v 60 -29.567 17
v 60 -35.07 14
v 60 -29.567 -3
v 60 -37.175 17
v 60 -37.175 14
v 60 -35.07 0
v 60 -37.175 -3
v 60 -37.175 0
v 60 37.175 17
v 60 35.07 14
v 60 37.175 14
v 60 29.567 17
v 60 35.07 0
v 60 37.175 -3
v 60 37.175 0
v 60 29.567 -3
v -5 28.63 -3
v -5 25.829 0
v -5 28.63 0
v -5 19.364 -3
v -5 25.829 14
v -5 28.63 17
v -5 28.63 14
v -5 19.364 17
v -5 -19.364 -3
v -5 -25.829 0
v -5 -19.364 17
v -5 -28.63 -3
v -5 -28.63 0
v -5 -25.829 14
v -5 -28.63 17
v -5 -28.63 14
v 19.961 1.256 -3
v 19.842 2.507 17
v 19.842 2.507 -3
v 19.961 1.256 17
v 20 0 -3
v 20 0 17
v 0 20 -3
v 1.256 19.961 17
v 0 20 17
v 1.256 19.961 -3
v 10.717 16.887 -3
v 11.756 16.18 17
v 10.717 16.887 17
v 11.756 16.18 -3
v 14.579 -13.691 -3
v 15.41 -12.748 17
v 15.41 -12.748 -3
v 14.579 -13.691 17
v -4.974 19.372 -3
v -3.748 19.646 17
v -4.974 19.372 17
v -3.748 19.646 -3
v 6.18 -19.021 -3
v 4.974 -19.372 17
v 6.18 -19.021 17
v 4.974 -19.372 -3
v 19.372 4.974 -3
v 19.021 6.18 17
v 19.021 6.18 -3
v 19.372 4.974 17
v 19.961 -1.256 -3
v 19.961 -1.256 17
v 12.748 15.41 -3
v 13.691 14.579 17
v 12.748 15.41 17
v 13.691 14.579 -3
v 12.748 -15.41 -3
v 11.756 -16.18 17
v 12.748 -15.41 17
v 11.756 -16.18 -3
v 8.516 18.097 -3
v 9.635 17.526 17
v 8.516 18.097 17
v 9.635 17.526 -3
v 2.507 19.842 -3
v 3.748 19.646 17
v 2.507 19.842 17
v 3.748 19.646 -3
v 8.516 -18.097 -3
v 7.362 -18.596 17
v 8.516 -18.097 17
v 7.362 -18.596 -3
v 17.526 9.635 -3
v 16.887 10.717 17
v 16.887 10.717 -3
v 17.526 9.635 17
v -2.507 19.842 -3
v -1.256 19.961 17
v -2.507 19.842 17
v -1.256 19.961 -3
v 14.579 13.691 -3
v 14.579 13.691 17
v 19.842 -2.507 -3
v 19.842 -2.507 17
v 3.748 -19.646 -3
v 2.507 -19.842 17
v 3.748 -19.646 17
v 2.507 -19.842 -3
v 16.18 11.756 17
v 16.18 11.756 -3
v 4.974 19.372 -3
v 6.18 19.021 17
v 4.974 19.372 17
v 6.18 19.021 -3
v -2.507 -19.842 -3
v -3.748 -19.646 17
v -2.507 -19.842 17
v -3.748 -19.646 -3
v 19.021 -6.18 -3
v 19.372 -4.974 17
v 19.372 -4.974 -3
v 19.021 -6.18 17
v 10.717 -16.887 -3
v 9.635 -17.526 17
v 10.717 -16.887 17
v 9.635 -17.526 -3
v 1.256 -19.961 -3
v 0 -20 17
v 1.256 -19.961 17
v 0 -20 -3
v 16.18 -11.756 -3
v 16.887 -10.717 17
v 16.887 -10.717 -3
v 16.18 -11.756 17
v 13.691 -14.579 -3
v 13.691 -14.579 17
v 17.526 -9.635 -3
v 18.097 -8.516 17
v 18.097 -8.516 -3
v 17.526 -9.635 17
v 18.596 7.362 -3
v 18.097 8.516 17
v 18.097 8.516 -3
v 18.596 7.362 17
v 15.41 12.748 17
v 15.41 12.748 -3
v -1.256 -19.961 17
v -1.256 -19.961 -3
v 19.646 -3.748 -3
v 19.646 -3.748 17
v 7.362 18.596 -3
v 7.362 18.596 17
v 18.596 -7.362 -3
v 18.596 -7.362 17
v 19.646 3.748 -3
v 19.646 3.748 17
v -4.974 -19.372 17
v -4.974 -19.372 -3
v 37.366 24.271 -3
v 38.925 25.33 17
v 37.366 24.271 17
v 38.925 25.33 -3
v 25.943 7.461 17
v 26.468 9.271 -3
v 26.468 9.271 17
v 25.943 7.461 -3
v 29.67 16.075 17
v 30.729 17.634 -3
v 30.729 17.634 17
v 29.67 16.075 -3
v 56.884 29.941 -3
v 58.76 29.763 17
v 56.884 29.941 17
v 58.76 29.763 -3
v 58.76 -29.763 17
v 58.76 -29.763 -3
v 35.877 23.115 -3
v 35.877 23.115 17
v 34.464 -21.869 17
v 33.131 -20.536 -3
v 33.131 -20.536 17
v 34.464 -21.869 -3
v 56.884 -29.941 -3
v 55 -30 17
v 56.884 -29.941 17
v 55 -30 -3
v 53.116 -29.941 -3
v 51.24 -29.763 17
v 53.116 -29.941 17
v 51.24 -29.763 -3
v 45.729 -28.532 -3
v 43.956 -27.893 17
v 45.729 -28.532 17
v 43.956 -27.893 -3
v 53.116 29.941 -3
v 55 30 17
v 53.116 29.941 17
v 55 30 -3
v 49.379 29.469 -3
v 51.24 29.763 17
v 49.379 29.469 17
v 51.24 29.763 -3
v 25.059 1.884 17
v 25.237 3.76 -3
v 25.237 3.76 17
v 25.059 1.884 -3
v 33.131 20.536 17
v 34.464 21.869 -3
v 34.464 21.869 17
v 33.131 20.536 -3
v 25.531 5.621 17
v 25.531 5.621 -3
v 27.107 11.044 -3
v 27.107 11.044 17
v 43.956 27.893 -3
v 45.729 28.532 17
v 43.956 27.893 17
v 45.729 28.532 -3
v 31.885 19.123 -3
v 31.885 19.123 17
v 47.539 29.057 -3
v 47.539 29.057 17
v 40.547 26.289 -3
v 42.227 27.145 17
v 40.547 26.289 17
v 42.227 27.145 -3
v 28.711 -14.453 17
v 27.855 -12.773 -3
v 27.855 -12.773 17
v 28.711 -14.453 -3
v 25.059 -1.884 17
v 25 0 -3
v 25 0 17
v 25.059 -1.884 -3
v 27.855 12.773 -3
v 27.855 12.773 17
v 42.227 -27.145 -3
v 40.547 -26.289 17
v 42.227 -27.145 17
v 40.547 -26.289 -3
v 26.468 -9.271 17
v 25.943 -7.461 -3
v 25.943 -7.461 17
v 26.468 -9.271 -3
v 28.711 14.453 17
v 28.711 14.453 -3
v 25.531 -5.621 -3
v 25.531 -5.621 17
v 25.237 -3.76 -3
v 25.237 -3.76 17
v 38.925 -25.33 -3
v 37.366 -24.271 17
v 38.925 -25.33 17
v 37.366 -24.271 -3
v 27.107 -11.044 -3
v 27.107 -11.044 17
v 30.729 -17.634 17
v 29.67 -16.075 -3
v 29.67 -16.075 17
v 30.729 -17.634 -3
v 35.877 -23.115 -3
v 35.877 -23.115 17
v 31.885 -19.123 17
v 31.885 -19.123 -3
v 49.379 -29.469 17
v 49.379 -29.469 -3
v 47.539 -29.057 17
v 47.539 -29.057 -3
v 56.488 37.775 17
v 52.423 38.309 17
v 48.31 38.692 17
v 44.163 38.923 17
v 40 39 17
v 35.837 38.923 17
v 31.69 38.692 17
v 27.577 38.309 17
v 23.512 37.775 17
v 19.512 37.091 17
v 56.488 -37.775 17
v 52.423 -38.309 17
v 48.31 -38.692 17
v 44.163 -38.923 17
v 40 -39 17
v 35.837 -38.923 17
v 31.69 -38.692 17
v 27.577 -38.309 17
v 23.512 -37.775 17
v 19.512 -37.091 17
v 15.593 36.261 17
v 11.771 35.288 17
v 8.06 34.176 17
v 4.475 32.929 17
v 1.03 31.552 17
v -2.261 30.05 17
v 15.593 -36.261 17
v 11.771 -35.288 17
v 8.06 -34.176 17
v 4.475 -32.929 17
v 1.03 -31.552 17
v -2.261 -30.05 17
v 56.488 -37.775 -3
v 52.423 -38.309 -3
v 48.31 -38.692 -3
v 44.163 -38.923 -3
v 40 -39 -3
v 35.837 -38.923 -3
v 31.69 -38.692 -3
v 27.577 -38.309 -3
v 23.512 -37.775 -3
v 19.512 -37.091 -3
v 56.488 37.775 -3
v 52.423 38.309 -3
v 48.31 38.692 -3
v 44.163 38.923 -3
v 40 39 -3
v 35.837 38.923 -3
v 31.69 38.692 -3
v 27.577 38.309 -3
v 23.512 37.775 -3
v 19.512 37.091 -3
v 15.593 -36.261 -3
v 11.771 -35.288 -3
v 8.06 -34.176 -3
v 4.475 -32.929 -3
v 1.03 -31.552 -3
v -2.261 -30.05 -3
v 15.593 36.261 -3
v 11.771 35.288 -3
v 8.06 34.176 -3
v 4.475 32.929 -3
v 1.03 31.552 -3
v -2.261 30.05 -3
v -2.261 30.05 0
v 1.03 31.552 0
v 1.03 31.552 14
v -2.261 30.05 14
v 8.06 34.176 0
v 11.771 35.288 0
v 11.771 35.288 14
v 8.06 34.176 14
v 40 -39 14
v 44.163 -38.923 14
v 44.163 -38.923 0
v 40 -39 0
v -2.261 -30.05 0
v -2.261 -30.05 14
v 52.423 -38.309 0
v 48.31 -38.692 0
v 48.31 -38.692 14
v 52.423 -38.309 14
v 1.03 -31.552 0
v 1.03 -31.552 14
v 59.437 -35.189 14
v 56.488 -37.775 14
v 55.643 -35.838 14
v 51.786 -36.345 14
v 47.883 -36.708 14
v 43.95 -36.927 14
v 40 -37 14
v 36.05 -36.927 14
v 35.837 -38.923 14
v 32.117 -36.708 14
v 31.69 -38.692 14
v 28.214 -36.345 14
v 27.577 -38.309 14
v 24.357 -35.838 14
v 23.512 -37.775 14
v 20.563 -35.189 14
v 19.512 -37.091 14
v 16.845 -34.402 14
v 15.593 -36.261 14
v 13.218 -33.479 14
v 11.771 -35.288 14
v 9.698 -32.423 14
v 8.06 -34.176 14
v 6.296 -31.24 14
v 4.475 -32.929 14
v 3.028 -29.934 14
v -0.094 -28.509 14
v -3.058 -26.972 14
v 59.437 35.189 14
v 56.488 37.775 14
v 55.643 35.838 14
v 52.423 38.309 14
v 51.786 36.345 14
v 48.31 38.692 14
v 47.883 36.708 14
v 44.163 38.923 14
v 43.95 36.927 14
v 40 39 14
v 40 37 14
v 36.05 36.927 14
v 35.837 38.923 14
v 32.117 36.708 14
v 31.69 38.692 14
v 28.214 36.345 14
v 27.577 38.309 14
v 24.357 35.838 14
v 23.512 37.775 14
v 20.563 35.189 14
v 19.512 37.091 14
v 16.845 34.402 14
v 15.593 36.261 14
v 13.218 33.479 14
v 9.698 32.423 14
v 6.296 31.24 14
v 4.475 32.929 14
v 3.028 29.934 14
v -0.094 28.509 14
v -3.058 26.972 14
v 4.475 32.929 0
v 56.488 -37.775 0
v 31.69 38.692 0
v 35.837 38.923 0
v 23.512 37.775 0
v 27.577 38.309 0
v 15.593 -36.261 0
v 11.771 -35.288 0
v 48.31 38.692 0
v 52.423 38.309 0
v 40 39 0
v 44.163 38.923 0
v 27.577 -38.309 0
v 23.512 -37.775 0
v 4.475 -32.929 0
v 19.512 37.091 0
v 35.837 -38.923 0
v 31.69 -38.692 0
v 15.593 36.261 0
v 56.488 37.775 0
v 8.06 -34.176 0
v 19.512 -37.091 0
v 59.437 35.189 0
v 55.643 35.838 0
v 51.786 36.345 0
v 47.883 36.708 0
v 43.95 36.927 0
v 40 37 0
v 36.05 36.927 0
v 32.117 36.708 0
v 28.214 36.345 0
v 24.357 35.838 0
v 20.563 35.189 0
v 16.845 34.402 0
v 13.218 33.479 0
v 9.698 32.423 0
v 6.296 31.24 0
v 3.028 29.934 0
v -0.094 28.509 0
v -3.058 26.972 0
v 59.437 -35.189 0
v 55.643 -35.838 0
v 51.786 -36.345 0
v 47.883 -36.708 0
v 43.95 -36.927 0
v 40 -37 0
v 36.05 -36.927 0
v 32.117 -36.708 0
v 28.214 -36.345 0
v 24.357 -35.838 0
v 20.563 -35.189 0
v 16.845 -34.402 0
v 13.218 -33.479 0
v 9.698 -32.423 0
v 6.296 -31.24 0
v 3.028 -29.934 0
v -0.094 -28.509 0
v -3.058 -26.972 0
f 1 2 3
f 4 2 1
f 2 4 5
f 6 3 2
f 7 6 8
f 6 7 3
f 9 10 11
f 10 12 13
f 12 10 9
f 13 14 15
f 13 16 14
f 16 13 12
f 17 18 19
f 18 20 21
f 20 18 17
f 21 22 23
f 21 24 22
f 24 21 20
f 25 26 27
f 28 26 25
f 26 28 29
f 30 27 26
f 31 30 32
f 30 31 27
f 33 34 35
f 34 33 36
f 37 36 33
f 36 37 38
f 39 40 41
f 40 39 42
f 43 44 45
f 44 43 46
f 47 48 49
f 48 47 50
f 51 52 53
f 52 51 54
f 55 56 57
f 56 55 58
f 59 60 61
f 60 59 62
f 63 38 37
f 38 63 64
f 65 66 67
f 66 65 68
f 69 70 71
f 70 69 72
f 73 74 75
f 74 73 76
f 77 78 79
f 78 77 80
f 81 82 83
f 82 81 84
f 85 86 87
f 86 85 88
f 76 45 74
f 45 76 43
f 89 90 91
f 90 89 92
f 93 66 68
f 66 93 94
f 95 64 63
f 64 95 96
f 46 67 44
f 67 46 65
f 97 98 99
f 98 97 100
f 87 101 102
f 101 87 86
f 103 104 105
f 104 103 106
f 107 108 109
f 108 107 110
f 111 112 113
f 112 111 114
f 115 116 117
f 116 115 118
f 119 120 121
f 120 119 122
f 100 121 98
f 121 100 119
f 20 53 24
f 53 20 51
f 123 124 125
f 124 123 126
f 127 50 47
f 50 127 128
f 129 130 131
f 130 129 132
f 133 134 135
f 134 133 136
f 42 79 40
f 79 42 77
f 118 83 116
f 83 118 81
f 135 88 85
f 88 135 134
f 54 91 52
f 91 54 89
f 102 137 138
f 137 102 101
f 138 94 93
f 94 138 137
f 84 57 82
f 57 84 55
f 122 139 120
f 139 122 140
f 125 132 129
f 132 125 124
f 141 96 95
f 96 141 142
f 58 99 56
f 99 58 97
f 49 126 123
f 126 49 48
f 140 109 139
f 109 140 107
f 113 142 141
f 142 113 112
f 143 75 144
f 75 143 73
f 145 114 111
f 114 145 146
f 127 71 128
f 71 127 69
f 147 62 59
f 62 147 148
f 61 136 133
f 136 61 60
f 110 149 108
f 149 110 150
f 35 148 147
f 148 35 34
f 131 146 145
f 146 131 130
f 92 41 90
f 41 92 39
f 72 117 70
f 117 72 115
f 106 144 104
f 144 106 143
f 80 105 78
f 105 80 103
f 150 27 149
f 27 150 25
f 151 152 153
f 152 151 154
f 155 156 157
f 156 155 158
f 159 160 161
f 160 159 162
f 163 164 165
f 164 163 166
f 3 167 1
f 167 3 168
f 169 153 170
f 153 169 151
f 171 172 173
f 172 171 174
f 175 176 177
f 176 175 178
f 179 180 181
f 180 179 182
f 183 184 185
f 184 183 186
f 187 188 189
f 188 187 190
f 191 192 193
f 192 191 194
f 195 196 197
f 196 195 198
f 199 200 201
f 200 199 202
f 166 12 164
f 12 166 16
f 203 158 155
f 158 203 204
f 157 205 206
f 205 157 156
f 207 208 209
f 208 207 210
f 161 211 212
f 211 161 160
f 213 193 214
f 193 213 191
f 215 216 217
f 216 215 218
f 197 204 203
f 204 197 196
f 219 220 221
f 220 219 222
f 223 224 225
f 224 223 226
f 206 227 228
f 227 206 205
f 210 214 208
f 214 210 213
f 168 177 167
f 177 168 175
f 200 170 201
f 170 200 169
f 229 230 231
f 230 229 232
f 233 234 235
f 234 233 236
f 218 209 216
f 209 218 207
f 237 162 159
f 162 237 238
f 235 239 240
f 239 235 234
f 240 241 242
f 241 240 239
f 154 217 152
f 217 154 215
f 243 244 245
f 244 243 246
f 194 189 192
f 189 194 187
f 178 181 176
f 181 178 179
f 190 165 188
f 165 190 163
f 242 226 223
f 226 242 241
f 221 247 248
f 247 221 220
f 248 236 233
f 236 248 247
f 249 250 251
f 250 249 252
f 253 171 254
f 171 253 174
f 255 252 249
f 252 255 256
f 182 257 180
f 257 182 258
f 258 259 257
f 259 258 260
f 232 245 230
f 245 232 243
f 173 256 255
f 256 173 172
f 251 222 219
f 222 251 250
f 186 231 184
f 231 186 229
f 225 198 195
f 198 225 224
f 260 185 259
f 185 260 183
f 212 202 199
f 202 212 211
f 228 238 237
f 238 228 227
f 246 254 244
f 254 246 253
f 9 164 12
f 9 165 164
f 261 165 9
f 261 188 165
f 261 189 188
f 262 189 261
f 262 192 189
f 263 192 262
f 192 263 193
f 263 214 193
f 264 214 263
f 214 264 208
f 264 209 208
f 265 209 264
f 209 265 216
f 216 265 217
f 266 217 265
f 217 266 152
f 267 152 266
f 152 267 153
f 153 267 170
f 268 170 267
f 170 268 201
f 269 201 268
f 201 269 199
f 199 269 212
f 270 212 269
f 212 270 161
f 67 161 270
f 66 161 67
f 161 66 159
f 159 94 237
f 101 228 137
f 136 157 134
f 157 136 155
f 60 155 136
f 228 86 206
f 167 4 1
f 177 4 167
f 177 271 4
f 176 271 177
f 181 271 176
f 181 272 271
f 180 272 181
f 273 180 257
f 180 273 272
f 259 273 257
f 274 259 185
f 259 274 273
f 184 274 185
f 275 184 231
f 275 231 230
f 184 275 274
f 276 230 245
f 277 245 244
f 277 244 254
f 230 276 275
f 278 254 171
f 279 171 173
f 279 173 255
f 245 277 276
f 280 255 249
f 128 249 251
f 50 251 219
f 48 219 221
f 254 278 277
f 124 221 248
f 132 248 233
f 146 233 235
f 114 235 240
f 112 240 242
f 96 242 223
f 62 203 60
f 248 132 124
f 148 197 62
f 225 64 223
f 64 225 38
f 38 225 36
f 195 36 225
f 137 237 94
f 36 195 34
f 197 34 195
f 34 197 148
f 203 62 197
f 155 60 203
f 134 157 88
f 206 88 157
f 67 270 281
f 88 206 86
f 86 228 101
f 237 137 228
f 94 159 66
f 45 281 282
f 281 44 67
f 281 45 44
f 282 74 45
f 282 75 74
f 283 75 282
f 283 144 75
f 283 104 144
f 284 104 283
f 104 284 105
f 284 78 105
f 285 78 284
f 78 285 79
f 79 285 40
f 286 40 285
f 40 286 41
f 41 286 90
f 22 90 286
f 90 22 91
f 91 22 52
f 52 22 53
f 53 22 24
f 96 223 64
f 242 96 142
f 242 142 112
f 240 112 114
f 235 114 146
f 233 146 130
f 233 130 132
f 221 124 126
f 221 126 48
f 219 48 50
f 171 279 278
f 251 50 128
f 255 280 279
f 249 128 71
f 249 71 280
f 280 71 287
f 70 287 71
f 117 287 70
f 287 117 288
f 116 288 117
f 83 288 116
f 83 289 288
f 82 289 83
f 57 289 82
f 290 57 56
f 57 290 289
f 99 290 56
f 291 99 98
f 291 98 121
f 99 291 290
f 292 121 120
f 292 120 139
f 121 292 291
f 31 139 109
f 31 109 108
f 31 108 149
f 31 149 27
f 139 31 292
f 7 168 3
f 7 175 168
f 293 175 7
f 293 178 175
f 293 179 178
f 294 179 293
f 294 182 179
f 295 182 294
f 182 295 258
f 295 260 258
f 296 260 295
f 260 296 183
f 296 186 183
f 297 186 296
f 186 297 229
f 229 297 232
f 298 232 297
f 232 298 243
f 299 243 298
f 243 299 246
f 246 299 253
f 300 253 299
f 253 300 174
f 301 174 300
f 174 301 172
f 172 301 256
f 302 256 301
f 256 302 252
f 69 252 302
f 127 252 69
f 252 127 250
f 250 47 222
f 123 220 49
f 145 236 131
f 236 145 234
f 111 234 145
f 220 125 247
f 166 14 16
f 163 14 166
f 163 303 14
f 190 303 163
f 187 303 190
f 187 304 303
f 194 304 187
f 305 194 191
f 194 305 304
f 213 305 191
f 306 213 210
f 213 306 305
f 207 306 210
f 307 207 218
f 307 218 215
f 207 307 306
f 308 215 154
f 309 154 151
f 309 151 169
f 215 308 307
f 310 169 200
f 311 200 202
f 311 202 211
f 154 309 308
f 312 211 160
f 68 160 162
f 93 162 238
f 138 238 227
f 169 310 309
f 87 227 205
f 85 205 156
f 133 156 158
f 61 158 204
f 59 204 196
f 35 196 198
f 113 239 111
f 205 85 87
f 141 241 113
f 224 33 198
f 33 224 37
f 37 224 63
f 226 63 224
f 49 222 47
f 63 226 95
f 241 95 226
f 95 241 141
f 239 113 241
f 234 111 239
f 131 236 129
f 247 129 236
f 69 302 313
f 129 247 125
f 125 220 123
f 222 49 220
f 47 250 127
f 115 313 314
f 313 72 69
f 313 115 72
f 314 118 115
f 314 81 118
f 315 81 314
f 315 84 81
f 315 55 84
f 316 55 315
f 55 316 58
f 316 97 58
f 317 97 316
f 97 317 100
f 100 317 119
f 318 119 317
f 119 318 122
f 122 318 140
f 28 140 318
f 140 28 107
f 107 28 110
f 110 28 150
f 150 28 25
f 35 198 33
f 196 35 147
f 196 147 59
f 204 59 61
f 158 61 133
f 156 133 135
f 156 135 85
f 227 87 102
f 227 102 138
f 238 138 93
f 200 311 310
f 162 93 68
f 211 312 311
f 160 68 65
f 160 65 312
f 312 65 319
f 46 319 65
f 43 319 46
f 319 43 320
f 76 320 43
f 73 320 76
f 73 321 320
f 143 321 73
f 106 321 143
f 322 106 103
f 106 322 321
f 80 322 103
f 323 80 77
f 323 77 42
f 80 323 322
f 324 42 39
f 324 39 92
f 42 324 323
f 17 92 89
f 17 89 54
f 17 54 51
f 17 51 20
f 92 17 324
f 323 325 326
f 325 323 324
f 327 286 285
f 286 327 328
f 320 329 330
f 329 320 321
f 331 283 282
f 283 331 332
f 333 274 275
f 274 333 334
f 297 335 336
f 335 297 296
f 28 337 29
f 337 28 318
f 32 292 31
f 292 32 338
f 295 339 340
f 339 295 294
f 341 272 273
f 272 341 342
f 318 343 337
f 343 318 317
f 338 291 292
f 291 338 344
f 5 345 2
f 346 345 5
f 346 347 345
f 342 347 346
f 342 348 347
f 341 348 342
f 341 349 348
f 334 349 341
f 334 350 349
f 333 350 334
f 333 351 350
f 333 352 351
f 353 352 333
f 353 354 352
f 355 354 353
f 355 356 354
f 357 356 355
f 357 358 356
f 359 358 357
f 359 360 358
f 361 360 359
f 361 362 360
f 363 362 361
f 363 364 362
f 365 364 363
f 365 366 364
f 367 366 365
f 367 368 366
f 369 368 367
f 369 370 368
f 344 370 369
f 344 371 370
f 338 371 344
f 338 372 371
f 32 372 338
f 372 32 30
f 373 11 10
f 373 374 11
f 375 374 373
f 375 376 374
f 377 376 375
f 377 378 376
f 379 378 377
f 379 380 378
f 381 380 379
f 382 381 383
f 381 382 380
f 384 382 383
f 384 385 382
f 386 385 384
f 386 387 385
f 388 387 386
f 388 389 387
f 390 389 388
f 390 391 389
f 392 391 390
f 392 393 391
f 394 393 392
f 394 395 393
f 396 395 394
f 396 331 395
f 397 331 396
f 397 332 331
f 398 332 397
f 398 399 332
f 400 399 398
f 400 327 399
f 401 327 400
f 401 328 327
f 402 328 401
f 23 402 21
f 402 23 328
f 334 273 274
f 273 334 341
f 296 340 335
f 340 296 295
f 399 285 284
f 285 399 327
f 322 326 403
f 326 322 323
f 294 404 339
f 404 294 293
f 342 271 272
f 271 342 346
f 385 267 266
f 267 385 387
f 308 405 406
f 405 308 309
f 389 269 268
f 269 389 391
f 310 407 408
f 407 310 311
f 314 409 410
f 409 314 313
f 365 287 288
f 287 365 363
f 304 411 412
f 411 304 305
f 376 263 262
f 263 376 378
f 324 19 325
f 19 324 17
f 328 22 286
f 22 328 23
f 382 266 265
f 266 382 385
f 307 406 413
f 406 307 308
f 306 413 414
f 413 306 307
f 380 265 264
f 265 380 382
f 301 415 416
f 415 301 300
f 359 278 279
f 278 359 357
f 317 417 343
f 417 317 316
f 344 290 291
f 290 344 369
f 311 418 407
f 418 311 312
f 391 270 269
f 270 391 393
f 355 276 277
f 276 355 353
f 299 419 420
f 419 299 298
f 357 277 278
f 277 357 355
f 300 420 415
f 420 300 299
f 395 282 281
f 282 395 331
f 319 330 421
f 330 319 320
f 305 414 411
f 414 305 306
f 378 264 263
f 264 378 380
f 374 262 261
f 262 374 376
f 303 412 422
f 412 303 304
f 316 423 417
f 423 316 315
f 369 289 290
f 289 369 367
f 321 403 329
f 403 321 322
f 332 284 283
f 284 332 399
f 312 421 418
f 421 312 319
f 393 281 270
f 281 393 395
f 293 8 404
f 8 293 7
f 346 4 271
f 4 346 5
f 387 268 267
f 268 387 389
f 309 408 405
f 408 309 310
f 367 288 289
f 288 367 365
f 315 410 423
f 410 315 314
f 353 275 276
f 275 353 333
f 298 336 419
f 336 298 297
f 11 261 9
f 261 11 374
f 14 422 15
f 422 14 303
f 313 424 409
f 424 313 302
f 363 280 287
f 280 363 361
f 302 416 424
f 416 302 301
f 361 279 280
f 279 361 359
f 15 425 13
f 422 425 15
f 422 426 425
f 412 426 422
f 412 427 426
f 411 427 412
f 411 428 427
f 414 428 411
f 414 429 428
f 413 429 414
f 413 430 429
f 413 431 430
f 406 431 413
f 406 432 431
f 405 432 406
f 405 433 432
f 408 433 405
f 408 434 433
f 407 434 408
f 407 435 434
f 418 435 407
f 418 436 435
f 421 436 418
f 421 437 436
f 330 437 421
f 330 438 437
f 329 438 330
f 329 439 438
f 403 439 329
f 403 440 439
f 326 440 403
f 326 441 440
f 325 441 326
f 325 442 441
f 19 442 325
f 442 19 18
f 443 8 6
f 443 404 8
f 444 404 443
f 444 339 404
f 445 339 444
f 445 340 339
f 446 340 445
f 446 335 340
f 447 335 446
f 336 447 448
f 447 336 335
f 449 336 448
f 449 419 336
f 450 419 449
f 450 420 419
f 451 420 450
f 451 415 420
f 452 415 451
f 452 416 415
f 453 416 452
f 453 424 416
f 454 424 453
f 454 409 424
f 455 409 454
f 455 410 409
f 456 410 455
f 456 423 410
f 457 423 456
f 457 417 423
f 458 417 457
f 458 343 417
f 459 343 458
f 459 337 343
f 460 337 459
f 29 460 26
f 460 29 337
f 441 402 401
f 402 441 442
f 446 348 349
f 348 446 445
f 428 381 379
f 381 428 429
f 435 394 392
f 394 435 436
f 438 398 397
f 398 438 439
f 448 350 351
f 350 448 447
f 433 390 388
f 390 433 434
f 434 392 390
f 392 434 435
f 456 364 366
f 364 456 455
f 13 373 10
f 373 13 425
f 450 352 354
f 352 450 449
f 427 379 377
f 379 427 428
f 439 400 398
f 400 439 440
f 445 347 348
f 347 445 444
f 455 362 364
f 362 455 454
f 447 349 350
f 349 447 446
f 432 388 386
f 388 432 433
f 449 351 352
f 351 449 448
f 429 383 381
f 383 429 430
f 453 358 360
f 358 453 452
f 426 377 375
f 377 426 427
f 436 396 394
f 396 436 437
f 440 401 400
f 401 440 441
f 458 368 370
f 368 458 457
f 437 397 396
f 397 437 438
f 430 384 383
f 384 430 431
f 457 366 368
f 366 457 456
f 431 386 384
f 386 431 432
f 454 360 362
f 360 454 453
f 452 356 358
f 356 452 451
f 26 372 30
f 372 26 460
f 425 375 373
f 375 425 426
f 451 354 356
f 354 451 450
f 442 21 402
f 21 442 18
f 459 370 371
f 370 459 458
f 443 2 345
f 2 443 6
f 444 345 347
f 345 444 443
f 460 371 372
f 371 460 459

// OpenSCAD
$fn=100;

//Stand off for quick deploy stations but also holds everything in place for 

//tripod radii (R1) are 17.5, 19, 21
//PVC radii (R2) are 16.5, 20
//2" Galvanized Post is 50.8
//2" PVC radii is 30

//center offset (CeO) = 19 + 20 + 10 = 49

//cube length (CL) = CeO + CuO*2
//cube offset (CuO) = 5


CuO = 5;
R1 = 20; 
R2 = 30;
CeO = CuO+R1+R2;
CL = CeO + CuO*2;

////////////////////////////////////////////////////////////////////////////
intersection(){
    difference(){
        union(){
            
            // main block
            difference(){
                translate([-CuO,-CL,0]) cube([CL,CL*2,15]);
                translate([0,0,-1]) cylinder(20,R1,R1);
                translate([CeO,0,-1]) cylinder(20,R2,R2);
                }
            // bottom hose clamp holder
            translate([0,0,14]) difference(){
                translate([-CuO,-CL,0]) cube([CL,CL*2,3]);
                translate([0,0,-1]) cylinder(20,R1,R1);
                translate([CeO,0,-1]) cylinder(20,R2,R2);
                }
            // top hose clamp holder
            translate([0,0,-3]) difference(){
                translate([-CuO,-CL,0]) cube([CL,CL*2,3]);
                translate([0,0,-1]) cylinder(20,R1,R1);
                translate([CeO,0,-1]) cylinder(20,R2,R2);
                }
        }
        
        // creates the hose clamp cut and oval shape
        difference(){
        translate([CeO-15,0,0])
        scale([1.70, 1, 1])  // Stretches the cylinder in X direction
            cylinder(h = 14, r = R2+9);
        
        translate([CeO-15,0,-0.1])
        scale([1.70, 1, 1])  // Stretches the cylinder in X direction
            cylinder(h = 14.2, r = R2+7);
        }
    
    }

    // creates oval shape
    translate([CeO-15,0,-3])
    scale([1.7, 1, 1])  // Stretches the cylinder in X direction
        cylinder(h = 20, r = R2+9);
}
